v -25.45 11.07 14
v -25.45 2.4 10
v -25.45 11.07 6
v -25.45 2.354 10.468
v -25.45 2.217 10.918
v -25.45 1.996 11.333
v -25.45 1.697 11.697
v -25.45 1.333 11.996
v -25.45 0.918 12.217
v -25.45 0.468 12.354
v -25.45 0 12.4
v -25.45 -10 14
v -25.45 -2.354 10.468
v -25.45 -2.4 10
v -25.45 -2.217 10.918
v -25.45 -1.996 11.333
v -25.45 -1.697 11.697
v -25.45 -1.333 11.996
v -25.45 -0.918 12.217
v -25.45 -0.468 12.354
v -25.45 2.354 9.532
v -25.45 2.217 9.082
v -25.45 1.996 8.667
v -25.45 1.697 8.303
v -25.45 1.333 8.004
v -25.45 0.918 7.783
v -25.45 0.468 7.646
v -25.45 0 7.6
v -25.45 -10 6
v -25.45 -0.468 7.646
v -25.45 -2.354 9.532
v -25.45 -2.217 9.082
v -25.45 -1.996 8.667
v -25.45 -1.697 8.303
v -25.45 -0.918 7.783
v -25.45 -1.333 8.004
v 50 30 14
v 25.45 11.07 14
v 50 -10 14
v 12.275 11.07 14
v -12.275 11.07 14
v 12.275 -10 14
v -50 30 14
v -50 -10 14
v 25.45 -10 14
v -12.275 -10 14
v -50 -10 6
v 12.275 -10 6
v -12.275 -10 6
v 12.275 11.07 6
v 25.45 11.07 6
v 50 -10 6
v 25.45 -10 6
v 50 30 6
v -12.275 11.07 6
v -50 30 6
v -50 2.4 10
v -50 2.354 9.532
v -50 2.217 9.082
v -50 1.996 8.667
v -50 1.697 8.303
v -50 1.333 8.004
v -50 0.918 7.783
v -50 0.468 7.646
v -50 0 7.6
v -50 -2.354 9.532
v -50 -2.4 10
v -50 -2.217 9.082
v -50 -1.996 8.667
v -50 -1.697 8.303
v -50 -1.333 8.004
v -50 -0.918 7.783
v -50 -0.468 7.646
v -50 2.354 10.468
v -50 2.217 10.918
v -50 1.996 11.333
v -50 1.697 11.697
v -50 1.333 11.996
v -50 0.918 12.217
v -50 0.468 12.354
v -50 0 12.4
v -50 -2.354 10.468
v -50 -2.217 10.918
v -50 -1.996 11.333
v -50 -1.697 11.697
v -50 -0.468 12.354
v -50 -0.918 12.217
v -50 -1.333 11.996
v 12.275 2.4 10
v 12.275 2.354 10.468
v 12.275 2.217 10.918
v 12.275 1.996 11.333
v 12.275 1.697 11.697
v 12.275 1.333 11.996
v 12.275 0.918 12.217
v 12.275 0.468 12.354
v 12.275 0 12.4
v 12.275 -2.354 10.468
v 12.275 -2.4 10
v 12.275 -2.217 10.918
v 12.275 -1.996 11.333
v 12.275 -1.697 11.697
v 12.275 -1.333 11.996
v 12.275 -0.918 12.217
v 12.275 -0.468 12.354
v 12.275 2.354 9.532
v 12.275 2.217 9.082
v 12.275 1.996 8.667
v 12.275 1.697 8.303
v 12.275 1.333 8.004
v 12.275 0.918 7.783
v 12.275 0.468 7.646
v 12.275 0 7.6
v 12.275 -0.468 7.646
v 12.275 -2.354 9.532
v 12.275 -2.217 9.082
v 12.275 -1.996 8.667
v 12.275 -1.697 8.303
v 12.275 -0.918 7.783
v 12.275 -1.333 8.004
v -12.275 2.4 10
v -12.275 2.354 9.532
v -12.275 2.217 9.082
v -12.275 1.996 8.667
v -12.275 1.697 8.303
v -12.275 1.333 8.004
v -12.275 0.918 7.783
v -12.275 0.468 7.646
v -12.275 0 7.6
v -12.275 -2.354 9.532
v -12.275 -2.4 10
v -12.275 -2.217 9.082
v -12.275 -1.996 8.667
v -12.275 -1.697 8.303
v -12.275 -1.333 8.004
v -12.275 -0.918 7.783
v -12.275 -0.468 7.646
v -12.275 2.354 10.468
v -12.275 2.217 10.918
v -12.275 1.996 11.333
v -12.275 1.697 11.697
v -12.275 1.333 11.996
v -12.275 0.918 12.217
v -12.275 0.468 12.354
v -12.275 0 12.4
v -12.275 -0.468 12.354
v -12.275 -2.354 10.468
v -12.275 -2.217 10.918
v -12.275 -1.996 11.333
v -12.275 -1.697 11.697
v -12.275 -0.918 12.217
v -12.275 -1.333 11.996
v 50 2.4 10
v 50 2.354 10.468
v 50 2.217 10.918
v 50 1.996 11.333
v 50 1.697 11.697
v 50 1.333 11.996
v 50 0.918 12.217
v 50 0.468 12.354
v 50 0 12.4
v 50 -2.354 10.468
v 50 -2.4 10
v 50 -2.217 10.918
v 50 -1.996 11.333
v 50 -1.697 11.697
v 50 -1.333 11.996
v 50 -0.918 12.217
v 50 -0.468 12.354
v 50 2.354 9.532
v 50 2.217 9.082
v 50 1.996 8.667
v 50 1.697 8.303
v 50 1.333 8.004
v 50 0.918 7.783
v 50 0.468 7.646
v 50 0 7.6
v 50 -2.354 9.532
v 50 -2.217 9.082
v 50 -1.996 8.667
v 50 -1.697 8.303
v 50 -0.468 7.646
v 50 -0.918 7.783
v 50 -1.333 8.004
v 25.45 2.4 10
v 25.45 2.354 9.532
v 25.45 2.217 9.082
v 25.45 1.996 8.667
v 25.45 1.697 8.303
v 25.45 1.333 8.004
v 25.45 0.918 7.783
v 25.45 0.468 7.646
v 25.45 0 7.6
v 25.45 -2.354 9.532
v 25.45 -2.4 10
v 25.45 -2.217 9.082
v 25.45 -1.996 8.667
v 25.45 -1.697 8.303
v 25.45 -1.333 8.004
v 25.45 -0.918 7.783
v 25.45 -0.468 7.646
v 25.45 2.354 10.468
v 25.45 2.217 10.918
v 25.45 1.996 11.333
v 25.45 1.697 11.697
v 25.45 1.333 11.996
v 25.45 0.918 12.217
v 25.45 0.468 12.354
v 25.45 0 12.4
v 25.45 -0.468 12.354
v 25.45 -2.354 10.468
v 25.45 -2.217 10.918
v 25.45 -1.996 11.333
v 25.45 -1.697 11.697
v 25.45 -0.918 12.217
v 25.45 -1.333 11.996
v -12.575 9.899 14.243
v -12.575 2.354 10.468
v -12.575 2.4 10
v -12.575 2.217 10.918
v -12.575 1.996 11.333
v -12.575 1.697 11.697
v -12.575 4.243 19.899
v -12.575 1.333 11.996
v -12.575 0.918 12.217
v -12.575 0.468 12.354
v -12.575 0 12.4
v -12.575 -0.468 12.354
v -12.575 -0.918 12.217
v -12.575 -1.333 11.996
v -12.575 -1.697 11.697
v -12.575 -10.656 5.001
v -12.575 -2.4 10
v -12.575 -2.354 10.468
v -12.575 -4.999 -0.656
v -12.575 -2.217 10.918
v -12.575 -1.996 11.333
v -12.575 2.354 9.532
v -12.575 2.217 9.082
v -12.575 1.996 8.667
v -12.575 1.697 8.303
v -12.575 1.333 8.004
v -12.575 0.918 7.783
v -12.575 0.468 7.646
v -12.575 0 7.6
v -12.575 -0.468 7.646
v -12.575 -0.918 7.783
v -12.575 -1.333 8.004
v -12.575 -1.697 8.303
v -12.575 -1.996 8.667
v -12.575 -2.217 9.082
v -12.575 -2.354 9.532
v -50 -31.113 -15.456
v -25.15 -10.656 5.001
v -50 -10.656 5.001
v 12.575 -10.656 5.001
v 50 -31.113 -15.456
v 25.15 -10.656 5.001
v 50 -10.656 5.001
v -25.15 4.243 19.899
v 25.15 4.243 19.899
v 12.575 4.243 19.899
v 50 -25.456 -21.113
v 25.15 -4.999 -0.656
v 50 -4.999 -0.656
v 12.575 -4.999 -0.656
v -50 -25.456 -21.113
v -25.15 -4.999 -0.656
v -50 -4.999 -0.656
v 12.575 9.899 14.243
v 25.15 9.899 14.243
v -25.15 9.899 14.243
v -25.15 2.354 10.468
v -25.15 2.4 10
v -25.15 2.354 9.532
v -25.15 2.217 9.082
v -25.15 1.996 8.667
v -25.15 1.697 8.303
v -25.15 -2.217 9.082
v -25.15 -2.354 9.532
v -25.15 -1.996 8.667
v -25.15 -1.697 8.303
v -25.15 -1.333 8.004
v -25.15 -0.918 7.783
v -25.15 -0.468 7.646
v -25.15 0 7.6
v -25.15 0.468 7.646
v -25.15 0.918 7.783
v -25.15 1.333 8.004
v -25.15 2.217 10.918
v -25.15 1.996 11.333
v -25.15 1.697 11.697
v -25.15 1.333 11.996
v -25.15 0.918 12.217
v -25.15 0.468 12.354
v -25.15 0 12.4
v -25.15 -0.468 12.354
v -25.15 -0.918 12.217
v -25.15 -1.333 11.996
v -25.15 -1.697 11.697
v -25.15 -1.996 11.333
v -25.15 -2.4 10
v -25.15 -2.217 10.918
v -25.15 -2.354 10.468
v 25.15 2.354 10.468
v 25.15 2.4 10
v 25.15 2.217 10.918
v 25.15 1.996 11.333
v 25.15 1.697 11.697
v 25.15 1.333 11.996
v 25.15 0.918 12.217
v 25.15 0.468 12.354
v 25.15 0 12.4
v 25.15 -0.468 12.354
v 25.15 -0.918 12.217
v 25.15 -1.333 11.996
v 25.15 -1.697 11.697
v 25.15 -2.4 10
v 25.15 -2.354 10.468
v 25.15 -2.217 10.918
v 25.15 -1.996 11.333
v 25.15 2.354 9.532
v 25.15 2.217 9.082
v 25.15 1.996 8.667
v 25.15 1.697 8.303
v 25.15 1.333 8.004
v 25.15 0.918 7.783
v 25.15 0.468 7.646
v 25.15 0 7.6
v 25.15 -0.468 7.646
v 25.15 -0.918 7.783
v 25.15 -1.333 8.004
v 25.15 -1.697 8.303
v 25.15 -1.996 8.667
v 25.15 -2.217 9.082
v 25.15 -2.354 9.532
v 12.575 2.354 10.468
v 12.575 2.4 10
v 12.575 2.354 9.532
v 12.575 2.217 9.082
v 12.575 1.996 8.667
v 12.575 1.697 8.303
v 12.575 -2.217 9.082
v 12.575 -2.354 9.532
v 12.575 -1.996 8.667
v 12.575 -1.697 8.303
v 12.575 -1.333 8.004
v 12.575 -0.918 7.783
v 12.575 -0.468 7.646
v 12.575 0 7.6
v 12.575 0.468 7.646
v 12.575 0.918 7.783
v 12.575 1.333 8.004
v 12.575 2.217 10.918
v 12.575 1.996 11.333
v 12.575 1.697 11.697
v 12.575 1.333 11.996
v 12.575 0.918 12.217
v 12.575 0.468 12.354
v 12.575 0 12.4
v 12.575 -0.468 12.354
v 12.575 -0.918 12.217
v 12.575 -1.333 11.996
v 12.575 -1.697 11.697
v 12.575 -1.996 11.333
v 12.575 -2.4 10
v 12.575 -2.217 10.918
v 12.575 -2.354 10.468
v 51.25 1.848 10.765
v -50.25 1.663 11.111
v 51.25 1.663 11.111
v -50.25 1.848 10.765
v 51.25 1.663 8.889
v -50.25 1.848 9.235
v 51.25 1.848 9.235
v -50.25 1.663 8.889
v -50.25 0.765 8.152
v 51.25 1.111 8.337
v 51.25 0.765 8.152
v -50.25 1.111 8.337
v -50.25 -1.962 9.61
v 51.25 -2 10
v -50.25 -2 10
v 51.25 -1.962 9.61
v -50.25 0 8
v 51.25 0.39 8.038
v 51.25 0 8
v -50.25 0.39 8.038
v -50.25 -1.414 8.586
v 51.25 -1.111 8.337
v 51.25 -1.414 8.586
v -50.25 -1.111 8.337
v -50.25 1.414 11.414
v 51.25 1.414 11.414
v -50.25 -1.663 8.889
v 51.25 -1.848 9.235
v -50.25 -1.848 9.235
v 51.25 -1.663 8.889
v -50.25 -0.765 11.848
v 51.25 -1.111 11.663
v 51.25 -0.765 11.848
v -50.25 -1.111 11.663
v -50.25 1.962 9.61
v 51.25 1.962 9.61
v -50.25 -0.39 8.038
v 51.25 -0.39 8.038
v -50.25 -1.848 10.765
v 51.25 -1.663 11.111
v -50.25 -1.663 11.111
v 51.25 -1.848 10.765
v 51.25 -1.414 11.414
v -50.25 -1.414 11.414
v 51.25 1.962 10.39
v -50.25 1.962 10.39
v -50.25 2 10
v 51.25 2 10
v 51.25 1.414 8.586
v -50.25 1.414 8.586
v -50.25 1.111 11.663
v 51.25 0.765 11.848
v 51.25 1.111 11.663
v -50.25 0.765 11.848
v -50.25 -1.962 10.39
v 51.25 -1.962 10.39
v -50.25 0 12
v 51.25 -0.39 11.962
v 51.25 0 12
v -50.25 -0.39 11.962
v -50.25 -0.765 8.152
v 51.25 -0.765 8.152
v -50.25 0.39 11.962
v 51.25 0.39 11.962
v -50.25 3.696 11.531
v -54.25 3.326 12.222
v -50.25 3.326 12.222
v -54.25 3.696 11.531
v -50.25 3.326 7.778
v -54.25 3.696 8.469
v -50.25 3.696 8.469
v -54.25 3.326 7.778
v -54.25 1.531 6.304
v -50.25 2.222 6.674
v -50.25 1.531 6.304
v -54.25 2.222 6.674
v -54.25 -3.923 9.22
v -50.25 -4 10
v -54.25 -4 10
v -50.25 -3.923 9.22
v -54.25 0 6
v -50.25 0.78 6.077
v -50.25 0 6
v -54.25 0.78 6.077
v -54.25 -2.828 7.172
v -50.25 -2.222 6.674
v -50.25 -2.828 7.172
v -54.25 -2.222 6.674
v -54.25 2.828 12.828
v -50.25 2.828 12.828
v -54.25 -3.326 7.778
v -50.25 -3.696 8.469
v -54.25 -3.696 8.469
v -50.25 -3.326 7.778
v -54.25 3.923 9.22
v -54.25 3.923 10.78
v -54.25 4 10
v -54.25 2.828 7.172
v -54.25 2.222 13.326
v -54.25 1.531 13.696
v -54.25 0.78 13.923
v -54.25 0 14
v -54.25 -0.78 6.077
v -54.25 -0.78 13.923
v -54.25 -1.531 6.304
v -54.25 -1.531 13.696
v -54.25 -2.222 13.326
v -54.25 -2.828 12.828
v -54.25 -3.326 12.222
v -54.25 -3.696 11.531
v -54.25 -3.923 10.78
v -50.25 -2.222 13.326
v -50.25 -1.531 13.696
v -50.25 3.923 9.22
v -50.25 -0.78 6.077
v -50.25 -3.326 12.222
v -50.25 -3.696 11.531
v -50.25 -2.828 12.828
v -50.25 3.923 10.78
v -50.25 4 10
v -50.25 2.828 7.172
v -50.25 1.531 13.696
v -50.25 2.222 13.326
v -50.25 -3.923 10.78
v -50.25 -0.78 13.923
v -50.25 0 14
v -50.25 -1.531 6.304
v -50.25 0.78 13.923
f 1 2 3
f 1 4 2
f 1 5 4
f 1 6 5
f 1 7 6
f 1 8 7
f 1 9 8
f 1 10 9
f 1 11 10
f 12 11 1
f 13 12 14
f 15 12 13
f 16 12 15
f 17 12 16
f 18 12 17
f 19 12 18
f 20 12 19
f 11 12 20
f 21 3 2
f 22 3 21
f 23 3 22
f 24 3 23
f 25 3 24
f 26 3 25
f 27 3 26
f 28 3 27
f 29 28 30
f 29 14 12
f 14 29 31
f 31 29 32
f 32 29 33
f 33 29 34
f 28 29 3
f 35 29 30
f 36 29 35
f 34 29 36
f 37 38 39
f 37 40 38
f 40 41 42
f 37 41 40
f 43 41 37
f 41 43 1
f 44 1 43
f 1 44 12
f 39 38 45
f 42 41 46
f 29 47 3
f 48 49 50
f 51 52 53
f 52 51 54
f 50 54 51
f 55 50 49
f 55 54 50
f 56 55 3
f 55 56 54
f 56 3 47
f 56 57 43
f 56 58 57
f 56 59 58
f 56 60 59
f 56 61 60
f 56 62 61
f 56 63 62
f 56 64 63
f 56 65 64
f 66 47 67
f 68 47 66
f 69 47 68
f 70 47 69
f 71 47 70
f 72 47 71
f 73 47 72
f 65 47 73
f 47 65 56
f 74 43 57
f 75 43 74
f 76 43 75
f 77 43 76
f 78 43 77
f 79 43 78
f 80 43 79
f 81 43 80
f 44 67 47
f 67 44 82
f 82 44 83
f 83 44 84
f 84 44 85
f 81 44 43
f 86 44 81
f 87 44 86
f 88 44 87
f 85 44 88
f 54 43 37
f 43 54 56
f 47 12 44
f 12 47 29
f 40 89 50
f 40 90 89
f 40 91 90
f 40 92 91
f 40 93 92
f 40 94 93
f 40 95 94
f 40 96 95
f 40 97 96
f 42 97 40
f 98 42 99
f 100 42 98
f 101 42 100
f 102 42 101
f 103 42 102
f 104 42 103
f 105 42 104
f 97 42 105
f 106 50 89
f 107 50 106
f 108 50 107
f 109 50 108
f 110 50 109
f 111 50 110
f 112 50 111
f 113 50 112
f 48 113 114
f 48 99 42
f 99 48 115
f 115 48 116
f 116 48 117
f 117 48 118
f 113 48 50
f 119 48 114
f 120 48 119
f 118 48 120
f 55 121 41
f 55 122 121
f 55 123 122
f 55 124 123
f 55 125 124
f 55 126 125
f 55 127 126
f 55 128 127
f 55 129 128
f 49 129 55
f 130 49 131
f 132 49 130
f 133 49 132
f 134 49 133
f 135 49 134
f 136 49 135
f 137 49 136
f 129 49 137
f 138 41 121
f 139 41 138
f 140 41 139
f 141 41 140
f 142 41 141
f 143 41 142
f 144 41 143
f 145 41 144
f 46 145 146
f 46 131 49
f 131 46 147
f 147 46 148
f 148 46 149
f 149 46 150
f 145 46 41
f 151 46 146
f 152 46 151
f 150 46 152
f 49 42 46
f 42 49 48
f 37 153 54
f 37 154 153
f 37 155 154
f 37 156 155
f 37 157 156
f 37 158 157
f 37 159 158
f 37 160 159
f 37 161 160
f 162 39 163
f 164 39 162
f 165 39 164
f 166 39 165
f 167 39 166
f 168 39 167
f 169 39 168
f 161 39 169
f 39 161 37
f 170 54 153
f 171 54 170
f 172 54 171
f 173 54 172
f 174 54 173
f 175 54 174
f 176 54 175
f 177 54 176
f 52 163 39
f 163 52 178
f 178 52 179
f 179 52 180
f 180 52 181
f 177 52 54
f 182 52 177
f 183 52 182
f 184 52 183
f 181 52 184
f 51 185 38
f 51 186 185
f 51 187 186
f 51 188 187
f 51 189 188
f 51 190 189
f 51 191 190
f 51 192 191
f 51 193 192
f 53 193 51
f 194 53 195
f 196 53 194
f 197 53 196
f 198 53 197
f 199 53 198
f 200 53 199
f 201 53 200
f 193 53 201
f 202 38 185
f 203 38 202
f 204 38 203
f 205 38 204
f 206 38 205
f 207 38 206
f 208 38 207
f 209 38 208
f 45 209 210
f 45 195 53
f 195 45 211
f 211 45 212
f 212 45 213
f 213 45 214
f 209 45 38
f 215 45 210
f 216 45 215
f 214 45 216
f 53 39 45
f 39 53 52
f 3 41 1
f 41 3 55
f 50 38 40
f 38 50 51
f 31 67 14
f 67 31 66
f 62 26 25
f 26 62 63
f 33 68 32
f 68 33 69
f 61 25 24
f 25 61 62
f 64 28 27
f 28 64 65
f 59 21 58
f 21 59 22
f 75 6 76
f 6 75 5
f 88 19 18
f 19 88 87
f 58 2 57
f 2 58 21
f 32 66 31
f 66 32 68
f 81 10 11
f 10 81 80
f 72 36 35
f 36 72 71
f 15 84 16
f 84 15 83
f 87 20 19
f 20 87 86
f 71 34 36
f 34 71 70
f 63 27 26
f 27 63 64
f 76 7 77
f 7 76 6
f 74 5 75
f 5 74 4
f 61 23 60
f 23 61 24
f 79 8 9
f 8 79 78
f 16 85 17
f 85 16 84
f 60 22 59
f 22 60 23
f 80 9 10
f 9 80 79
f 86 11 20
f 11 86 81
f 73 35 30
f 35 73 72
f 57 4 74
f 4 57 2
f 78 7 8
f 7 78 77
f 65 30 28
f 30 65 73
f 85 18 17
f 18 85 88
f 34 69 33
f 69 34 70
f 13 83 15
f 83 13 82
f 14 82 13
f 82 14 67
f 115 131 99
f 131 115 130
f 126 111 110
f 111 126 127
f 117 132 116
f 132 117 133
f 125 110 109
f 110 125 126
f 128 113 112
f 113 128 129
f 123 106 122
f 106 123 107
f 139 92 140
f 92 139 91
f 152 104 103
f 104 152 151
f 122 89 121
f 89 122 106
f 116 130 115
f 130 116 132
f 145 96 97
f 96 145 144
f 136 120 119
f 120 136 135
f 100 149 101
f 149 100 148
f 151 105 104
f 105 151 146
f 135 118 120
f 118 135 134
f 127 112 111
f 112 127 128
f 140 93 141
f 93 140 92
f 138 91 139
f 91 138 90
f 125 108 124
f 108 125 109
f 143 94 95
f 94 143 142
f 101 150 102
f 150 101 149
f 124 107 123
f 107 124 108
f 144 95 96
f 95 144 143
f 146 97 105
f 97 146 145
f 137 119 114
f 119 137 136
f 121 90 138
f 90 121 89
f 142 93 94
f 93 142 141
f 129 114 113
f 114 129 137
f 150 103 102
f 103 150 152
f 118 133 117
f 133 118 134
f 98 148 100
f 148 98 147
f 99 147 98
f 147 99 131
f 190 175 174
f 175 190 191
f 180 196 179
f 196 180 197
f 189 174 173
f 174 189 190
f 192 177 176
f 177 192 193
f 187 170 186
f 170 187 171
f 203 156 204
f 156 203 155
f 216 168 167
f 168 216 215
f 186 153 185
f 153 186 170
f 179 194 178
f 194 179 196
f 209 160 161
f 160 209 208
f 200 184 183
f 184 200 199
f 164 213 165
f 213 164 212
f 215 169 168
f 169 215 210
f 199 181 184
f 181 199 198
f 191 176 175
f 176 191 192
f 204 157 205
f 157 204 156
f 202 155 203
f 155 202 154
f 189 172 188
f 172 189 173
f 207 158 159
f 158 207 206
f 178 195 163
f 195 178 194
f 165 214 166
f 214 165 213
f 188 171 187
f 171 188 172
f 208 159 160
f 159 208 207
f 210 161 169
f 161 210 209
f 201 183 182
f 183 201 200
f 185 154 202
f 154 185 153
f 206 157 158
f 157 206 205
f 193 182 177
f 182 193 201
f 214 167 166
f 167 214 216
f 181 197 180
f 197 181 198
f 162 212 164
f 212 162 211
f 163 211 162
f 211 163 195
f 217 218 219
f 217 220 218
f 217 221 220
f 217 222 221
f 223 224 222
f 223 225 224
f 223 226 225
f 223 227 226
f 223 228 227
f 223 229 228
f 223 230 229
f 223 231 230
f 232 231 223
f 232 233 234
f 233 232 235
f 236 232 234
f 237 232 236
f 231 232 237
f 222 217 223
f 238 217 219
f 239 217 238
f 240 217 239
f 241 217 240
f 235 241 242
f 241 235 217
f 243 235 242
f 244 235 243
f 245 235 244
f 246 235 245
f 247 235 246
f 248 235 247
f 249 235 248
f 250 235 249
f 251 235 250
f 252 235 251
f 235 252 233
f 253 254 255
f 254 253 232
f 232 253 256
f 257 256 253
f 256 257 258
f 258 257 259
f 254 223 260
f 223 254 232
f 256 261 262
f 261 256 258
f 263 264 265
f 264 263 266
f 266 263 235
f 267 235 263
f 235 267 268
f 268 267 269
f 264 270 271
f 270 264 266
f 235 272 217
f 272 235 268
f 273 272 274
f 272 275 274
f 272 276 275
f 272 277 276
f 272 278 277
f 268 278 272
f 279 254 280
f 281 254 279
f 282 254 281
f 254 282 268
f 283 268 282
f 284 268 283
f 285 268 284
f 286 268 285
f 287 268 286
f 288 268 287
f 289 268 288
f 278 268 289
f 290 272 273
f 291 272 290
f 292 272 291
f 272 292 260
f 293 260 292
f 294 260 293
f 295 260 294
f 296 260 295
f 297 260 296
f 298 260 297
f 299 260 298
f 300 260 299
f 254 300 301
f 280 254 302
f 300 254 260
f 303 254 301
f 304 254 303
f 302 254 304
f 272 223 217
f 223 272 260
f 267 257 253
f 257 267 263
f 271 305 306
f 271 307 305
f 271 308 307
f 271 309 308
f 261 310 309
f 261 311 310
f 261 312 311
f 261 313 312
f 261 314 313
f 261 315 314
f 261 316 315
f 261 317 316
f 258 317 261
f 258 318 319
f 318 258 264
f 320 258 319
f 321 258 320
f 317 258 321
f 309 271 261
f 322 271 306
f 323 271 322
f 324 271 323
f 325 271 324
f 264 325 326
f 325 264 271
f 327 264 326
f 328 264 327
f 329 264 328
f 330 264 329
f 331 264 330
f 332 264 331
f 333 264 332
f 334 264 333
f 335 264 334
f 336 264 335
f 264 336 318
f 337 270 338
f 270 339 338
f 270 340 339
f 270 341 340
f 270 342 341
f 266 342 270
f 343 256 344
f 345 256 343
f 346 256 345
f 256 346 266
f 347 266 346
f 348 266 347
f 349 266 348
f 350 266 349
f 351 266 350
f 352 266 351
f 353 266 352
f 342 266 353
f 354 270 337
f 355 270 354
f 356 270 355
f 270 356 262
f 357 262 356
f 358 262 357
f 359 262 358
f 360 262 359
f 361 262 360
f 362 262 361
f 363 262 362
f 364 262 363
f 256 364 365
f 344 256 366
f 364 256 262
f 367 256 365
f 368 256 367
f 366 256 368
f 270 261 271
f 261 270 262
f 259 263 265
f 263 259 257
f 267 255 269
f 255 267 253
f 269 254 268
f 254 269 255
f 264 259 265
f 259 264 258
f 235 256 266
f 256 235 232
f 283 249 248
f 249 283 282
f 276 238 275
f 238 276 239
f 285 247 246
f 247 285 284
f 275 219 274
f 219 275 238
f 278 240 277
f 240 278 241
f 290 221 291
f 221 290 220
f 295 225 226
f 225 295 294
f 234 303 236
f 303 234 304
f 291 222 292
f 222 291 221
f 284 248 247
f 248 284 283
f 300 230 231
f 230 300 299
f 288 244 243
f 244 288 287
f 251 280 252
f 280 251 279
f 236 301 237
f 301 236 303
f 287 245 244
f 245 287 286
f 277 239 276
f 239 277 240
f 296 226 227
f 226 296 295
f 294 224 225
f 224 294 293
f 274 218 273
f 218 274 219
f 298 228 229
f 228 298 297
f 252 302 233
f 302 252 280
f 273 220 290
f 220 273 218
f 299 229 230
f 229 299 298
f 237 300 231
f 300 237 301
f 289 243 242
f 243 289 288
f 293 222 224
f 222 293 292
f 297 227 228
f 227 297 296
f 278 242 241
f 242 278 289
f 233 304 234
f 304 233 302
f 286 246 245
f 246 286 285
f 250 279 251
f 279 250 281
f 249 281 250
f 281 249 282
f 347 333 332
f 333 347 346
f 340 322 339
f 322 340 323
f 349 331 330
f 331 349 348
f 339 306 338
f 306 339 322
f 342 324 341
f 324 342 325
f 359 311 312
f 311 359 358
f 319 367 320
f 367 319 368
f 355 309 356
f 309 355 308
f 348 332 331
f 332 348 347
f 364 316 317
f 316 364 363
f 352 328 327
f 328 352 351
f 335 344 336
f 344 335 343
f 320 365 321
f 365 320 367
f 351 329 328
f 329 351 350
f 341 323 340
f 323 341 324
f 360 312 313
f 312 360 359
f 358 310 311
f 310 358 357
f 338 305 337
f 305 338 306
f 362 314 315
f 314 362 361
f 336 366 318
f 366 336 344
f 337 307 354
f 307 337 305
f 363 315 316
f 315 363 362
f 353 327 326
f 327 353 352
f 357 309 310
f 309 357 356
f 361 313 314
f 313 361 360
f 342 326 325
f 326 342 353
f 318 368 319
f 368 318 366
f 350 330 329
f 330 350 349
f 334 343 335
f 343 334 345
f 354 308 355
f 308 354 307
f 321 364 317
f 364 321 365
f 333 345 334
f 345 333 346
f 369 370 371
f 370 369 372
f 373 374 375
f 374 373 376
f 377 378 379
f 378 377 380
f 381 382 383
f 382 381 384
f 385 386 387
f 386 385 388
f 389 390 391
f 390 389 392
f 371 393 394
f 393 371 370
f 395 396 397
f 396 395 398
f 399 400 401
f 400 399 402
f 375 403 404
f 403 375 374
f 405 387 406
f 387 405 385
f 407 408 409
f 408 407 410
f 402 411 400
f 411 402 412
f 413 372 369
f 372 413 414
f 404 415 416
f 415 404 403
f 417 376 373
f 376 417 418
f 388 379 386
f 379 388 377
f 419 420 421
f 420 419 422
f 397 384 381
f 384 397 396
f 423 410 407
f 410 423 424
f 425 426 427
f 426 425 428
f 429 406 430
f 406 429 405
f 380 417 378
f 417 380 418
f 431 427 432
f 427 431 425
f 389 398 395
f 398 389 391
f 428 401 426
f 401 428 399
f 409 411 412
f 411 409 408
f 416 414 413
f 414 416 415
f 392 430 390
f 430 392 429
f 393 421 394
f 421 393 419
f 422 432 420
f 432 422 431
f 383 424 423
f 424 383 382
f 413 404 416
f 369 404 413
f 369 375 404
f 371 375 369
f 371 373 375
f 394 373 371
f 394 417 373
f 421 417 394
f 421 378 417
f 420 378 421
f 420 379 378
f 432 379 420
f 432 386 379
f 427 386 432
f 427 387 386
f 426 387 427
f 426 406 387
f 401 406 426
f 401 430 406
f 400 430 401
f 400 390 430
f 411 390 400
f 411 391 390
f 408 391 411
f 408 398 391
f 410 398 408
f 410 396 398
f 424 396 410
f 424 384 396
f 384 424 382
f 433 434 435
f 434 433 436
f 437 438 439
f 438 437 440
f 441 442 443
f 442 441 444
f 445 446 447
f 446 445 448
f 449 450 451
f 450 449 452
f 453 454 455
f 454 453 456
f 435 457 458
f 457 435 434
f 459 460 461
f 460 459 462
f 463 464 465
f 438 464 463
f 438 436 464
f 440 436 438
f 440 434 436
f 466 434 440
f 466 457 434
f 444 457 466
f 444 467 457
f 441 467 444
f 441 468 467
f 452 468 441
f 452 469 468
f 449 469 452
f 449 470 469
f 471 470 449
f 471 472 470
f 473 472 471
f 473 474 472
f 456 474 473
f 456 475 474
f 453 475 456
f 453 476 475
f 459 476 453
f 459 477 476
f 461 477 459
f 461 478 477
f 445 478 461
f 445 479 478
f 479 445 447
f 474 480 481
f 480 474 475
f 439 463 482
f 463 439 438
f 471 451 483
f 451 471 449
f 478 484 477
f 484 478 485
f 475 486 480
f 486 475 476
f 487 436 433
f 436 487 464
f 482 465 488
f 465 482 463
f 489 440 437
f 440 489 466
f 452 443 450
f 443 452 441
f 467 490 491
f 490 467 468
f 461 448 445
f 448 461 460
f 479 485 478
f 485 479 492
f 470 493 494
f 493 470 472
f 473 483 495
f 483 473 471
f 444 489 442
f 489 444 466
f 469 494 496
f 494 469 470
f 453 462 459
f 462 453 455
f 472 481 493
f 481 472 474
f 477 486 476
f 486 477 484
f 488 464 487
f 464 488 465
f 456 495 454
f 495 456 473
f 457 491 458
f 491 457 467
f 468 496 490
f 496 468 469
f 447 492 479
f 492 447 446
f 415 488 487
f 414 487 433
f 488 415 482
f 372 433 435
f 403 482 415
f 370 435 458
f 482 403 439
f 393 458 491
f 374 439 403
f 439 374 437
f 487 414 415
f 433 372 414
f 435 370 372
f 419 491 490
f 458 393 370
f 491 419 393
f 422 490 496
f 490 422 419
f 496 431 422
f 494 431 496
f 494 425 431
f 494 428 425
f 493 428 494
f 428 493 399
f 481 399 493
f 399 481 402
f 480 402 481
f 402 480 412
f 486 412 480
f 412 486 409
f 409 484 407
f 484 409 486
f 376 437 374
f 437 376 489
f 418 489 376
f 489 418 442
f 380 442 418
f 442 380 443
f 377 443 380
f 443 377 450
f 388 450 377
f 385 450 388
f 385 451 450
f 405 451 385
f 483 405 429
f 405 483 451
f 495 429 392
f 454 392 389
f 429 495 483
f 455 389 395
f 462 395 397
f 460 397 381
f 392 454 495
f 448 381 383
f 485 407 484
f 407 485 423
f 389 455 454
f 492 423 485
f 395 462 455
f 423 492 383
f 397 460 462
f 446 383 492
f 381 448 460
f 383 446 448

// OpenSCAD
$fn = 32;

// ------------------------------------------------------------------------
// Butt hinge: hinge 100 mm, leaf swung 45 deg
// Every part is its own module, assembly() places every instance.
// ------------------------------------------------------------------------

// --- part 1 ---
module hinge_base() {
  difference() {
    union() {
      translate([-50, -10, -4]) cube([24.55, 40, 8]);
      translate([-12.275, -10, -4]) cube([24.55, 40, 8]);
      translate([25.45, -10, -4]) cube([24.55, 40, 8]);
      translate([-50, 11.07, -4]) cube([100, 18.93, 8]);
    }
    translate([-37.725, 0, 0]) rotate([0, 90, 0]) cylinder(h = 26.55, d = 4.8, center = true);
    translate([0, 0, 0]) rotate([0, 90, 0]) cylinder(h = 26.55, d = 4.8, center = true);
    translate([37.725, 0, 0]) rotate([0, 90, 0]) cylinder(h = 26.55, d = 4.8, center = true);
  }
}

// --- part 2 ---
module hinge_mover() {
  difference() {
    union() {
      translate([-25.15, -40, -4]) cube([12.575, 50, 8]);
      translate([12.575, -40, -4]) cube([12.575, 50, 8]);
      translate([-50, -40, -4]) cube([100, 28.93, 8]);
    }
    translate([-18.863, 0, 0]) rotate([0, 90, 0]) cylinder(h = 14.575, d = 4.8, center = true);
    translate([18.863, 0, 0]) rotate([0, 90, 0]) cylinder(h = 14.575, d = 4.8, center = true);
  }
}

// --- part 3 ---
module hinge_pin() {
  rotate([0, 90, 0]) cylinder(h = 102.5, d = 4, center = true);
  translate([-54.25, 0, 0]) rotate([0, 90, 0]) cylinder(h = 4, d = 8);
}

// --- assembly ---
module assembly() {
  color([0.80, 0.24, 0.20]) translate([0, 0, 10]) rotate([0, 0, 0]) hinge_base();
  color([0.20, 0.45, 0.75]) translate([0, 0, 10]) rotate([45, 0, 0]) hinge_mover();
  color([0.25, 0.62, 0.32]) translate([0, 0, 10]) rotate([0, 0, 0]) hinge_pin();
}

assembly();
